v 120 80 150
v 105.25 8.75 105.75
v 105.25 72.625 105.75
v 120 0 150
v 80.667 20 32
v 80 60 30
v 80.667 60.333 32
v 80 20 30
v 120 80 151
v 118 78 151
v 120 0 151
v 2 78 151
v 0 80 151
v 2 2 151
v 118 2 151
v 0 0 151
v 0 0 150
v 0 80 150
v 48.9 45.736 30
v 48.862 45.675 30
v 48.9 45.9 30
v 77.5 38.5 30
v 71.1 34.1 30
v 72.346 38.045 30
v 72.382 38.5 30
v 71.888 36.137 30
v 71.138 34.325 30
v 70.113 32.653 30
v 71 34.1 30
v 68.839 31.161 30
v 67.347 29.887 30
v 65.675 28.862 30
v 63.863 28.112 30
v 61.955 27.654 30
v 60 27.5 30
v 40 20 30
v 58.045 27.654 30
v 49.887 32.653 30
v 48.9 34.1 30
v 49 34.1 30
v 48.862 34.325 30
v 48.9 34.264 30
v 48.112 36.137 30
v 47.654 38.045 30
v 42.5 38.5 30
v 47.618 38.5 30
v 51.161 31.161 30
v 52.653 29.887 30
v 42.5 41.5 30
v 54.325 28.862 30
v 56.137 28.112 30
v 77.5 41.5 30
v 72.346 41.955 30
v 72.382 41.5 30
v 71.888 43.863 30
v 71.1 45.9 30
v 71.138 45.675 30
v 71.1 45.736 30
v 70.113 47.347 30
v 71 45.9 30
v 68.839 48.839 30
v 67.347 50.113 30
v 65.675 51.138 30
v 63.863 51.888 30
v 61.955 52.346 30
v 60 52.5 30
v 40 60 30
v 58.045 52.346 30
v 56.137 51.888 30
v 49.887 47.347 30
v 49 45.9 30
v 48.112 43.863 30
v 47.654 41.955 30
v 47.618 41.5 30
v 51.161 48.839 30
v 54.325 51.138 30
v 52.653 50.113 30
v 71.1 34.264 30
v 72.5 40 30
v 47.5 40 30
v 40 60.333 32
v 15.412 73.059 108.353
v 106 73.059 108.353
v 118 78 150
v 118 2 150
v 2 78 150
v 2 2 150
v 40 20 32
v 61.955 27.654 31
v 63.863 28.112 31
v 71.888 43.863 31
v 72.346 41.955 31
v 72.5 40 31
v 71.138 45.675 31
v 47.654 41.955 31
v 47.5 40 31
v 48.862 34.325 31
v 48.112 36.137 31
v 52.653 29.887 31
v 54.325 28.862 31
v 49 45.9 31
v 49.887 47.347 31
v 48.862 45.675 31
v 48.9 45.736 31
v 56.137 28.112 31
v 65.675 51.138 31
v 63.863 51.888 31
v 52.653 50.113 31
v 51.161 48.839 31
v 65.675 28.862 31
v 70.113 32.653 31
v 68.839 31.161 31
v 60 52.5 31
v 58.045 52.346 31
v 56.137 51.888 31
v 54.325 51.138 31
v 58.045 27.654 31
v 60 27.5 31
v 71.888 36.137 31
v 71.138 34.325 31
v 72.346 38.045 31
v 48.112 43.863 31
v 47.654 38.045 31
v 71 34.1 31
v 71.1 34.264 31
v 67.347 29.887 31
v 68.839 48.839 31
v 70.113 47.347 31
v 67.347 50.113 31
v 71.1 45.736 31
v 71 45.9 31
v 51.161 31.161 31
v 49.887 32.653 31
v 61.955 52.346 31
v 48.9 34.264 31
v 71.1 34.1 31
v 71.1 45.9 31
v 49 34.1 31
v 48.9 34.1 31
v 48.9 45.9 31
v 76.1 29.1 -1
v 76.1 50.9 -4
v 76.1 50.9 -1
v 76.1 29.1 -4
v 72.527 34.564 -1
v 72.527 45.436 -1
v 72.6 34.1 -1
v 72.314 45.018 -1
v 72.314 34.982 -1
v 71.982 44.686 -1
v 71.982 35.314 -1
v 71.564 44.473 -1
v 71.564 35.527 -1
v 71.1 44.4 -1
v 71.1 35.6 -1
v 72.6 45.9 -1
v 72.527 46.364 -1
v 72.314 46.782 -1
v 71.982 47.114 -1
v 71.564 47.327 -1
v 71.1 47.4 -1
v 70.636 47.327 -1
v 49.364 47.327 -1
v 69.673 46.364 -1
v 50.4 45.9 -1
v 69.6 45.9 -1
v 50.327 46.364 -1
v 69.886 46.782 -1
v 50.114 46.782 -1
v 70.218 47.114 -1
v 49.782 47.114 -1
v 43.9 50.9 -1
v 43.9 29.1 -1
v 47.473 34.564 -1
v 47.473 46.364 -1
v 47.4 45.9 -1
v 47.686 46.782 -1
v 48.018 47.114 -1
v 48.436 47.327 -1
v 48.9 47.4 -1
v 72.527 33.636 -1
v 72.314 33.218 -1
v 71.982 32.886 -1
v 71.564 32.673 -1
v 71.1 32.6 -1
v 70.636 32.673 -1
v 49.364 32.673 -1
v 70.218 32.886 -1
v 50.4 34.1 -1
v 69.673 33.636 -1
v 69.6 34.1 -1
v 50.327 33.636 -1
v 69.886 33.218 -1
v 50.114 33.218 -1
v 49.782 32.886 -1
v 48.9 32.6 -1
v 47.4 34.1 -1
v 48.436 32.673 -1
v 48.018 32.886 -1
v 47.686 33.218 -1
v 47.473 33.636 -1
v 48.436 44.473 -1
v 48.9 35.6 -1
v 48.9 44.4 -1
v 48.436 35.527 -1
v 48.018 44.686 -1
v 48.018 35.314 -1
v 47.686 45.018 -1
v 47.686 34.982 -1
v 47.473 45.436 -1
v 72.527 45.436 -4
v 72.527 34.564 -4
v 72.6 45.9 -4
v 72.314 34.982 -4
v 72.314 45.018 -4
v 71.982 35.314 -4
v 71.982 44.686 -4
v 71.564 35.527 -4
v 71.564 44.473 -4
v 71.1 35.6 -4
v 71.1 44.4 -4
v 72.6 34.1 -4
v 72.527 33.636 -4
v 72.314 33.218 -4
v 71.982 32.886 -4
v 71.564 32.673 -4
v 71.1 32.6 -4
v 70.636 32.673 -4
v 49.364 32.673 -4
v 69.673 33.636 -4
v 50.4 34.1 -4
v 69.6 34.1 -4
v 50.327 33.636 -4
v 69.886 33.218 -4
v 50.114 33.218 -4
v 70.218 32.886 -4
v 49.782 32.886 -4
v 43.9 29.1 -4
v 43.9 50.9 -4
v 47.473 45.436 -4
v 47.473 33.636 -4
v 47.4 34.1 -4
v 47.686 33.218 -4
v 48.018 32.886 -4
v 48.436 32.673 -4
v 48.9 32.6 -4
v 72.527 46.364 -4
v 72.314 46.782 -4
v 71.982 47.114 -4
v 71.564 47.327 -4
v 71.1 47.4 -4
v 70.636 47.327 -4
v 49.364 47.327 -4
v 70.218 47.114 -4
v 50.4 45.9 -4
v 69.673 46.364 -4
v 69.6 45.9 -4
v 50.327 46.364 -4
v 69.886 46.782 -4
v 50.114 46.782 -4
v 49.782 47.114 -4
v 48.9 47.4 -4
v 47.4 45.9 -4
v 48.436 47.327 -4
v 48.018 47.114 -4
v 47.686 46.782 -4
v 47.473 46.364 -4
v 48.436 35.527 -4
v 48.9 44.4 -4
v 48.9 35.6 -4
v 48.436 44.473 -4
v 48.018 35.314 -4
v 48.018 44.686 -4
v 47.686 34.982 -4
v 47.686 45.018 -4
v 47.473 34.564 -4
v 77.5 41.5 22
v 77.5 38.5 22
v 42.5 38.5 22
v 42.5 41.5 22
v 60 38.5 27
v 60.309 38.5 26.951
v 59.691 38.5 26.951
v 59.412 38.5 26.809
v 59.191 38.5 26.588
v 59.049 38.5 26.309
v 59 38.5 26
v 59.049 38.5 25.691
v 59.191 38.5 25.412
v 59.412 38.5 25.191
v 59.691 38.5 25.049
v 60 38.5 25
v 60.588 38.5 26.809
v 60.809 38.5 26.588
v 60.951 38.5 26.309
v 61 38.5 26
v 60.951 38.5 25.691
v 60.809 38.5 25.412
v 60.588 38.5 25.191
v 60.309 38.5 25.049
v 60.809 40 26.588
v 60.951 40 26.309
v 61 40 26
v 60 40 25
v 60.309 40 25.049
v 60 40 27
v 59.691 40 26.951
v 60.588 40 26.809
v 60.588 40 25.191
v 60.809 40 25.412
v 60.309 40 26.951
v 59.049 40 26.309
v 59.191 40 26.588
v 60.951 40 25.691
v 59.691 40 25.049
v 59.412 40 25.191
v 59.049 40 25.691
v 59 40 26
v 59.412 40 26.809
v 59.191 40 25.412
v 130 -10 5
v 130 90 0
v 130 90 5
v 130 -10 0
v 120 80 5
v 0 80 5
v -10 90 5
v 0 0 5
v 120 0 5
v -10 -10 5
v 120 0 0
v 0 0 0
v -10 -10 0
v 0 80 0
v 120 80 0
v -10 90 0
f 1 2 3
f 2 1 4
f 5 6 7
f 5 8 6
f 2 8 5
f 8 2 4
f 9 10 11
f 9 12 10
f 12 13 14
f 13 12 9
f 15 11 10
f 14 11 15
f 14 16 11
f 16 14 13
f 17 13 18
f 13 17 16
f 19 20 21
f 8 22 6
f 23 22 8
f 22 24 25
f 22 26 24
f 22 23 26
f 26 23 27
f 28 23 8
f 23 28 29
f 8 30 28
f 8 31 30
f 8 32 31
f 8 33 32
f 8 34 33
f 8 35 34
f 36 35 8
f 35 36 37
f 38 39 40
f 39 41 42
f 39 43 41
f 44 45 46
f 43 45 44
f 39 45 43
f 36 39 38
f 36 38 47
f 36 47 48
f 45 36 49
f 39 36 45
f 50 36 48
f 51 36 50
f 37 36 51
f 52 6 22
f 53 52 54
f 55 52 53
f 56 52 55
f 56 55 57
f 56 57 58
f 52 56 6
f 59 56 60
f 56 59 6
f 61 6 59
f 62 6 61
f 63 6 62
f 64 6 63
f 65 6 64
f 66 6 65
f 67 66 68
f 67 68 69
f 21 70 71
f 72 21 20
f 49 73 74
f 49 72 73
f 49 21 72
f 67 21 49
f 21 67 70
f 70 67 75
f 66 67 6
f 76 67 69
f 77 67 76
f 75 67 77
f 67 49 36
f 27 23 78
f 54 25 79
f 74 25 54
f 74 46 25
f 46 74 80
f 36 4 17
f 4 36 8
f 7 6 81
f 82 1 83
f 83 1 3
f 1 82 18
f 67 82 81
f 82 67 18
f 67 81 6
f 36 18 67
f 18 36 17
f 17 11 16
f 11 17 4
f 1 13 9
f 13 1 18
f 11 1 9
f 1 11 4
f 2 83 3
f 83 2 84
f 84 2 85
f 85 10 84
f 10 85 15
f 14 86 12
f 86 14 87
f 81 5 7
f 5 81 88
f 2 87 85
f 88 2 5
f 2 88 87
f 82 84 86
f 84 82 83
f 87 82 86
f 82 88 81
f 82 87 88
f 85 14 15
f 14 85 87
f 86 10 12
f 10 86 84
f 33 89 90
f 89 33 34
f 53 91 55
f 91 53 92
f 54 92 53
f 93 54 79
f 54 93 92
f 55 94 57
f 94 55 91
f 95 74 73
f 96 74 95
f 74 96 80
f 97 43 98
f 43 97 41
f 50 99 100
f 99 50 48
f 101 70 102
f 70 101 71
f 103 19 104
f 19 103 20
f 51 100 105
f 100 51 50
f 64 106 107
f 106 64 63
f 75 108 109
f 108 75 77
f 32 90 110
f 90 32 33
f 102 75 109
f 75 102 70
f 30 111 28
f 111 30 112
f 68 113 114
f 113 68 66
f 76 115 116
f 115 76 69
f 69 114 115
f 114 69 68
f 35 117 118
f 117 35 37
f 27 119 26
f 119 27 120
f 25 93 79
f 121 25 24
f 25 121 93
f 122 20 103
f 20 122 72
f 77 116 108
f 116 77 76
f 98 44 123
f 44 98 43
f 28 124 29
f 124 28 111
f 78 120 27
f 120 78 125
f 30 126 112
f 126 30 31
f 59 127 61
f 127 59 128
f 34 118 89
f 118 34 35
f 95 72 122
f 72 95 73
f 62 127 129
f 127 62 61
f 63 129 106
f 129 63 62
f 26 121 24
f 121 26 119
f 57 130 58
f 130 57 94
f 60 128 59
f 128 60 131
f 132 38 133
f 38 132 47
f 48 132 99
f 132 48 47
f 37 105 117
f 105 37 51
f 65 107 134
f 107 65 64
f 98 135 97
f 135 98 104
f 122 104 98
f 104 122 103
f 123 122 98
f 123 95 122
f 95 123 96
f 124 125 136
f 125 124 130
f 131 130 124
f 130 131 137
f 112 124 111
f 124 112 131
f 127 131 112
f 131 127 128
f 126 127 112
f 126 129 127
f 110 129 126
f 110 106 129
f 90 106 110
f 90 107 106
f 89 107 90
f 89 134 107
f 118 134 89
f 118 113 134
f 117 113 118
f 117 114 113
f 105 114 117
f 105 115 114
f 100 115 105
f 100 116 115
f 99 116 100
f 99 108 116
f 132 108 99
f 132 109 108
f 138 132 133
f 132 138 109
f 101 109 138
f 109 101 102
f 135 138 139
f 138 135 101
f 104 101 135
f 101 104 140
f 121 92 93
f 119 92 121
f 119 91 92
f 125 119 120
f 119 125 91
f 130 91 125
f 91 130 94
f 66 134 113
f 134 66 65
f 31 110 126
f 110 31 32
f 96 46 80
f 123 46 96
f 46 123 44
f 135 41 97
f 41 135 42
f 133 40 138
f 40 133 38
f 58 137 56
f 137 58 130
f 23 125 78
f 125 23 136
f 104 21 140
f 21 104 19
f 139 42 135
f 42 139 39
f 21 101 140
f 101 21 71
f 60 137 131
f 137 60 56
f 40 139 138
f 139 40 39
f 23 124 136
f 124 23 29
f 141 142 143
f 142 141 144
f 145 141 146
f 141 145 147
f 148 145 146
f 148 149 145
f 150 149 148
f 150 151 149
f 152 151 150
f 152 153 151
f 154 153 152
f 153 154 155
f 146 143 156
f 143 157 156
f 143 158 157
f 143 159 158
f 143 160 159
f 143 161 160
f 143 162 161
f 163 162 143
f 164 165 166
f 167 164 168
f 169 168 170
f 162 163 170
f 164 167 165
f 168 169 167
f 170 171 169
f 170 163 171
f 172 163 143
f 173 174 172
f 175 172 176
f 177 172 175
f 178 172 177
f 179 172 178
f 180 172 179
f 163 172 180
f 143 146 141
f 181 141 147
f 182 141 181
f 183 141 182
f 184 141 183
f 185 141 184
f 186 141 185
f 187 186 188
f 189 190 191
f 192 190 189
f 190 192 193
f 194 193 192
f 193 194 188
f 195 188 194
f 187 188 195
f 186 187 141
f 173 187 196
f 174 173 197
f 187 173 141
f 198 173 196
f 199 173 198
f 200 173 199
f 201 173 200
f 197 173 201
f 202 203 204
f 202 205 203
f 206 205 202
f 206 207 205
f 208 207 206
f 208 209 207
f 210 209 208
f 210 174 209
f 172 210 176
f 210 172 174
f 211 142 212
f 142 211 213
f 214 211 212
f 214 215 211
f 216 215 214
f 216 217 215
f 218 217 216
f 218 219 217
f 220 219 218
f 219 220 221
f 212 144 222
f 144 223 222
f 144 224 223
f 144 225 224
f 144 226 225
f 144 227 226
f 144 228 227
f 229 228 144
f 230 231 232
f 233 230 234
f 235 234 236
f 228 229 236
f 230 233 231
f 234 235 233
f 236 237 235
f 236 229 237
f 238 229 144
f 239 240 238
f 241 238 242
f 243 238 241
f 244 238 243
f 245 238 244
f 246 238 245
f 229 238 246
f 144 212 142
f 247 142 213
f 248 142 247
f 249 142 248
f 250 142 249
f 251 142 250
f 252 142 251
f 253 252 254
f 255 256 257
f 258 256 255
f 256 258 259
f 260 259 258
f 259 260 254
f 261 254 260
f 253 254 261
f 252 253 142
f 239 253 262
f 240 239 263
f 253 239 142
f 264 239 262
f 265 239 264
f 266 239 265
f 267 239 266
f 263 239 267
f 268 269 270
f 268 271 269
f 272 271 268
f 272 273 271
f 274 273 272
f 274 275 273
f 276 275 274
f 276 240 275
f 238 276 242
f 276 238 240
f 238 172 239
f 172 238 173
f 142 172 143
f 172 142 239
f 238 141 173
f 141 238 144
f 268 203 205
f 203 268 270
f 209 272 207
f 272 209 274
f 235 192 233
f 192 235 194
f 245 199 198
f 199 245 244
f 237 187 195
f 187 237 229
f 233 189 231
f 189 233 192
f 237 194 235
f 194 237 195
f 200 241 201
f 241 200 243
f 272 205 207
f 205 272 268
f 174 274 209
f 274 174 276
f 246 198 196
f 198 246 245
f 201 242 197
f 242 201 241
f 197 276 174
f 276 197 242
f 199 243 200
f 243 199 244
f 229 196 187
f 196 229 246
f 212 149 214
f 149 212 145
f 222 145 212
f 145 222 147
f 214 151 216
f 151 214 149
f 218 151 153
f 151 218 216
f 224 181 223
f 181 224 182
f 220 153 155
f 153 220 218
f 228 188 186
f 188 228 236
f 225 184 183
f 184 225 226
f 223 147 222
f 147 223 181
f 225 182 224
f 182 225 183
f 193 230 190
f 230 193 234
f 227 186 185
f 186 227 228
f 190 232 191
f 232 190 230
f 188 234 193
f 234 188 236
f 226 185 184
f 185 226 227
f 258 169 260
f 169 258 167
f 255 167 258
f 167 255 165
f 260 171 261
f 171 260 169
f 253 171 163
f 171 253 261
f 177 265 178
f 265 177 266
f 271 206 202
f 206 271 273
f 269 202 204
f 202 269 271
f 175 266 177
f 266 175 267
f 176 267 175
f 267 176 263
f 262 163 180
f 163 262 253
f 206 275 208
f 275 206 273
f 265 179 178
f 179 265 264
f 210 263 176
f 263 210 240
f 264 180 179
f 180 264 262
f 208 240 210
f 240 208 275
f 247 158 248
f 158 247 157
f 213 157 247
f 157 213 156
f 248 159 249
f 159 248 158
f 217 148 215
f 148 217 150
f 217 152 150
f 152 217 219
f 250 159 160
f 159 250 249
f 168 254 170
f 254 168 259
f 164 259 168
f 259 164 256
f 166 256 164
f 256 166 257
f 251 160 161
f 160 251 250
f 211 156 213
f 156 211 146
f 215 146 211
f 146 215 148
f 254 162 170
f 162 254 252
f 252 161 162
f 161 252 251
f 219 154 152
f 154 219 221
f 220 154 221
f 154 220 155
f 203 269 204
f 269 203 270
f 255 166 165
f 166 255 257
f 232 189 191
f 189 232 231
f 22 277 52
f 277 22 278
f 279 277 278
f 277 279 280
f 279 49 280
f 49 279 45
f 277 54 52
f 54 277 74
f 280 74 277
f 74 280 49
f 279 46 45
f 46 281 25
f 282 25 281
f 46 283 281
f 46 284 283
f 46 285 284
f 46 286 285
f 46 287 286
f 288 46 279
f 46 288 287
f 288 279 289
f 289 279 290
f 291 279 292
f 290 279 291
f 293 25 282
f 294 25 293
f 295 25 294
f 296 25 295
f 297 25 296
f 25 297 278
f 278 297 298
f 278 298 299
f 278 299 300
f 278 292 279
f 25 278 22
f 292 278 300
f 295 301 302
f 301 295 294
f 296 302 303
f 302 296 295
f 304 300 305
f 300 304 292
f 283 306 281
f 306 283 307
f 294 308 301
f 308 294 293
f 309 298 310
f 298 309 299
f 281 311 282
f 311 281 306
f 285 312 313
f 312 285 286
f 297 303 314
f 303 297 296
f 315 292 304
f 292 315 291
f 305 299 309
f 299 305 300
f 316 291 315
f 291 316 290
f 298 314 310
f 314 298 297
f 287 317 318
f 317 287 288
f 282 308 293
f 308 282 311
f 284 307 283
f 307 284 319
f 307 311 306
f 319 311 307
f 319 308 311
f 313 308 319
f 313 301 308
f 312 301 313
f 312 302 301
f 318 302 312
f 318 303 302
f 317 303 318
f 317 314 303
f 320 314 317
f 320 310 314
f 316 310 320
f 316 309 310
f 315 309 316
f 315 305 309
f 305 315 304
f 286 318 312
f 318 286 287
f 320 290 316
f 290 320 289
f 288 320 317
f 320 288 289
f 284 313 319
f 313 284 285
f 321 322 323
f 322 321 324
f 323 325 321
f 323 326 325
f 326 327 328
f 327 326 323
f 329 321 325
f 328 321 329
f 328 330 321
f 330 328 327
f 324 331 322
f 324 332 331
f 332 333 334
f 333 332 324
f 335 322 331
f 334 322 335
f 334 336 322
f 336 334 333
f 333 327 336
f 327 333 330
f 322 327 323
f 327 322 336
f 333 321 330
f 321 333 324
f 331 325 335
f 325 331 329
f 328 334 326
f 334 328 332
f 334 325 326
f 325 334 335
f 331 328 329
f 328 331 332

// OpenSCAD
// Automated Cat Feeder - Food Hopper
// OpenSCAD file for 3D printing

// Parameters
hopper_width = 120;
hopper_depth = 80;
hopper_height = 150;
wall_thickness = 2;
neck_width = 40;
neck_height = 30;
outlet_diameter = 25;

// Servo mounting
servo_width = 22.2;
servo_depth = 11.8;
servo_height = 31;
servo_mount_thickness = 3;

module main_hopper() {
    difference() {
        // Main hopper body
        hull() {
            // Top opening
            translate([0, 0, hopper_height])
            cube([hopper_width, hopper_depth, 1]);
            
            // Bottom neck
            translate([(hopper_width - neck_width)/2, (hopper_depth - neck_width)/2, neck_height])
            cube([neck_width, neck_width, 1]);
        }
        
        // Internal cavity
        translate([wall_thickness, wall_thickness, wall_thickness])
        hull() {
            // Top opening
            translate([0, 0, hopper_height - wall_thickness])
            cube([hopper_width - 2*wall_thickness, hopper_depth - 2*wall_thickness, 1]);
            
            // Bottom neck
            translate([(hopper_width - neck_width)/2 - wall_thickness, (hopper_depth - neck_width)/2 - wall_thickness, neck_height])
            cube([neck_width + 2*wall_thickness, neck_width + 2*wall_thickness, 1]);
        }
        
        // Food outlet
        translate([hopper_width/2, hopper_depth/2, 0])
        cylinder(h = neck_height + 1, d = outlet_diameter, $fn = 40);
        
        // Servo mounting cutout
        translate([(hopper_width - servo_width)/2, (hopper_depth - servo_depth)/2, neck_height - servo_height])
        cube([servo_width, servo_depth, servo_height + 1]);
    }
}

module servo_mount() {
    // Servo mounting bracket
    translate([(hopper_width - servo_width - 10)/2, (hopper_depth - servo_depth - 10)/2, neck_height - servo_height - servo_mount_thickness])
    difference() {
        cube([servo_width + 10, servo_depth + 10, servo_mount_thickness]);
        
        // Servo mounting holes
        translate([5, 5, -1])
        cylinder(h = servo_mount_thickness + 2, d = 3, $fn = 20);
        
        translate([servo_width + 5, 5, -1])
        cylinder(h = servo_mount_thickness + 2, d = 3, $fn = 20);
        
        translate([5, servo_depth + 5, -1])
        cylinder(h = servo_mount_thickness + 2, d = 3, $fn = 20);
        
        translate([servo_width + 5, servo_depth + 5, -1])
        cylinder(h = servo_mount_thickness + 2, d = 3, $fn = 20);
        
        // Servo body cutout
        translate([5, 5, -1])
        cube([servo_width, servo_depth, servo_mount_thickness + 2]);
    }
}

module food_gate() {
    gate_width = outlet_diameter + 10;
    gate_height = 8;
    gate_depth = 3;
    
    // Gate arm
    translate([(hopper_width - gate_width)/2, hopper_depth/2 - gate_depth/2, neck_height - gate_height])
    difference() {
        cube([gate_width, gate_depth, gate_height]);
        
        // Servo arm attachment hole
        translate([gate_width/2, gate_depth/2, gate_height/2])
        rotate([90, 0, 0])
        cylinder(h = gate_depth + 2, d = 2, $fn = 20);
    }
}

module mounting_flange() {
    flange_width = hopper_width + 20;
    flange_depth = hopper_depth + 20;
    flange_height = 5;
    
    translate([-10, -10, 0])
    difference() {
        cube([flange_width, flange_depth, flange_height]);
        
        // Mounting holes
        for (x = [15, flange_width - 15]) {
            for (y = [15, flange_depth - 15]) {
                translate([x, y, -1])
                cylinder(h = flange_height + 2, d = 4, $fn = 20);
            }
        }
        
        // Center cutout for hopper
        translate([10, 10, -1])
        cube([hopper_width, hopper_depth, flange_height + 2]);
    }
}

module lid() {
    lid_width = hopper_width + 10;
    lid_depth = hopper_depth + 10;
    lid_height = 5;
    
    translate([-5, -5, hopper_height])
    difference() {
        cube([lid_width, lid_depth, lid_height]);
        
        // Handle cutout
        translate([lid_width/2 - 15, lid_depth/2 - 5, lid_height - 3])
        cube([30, 10, 4]);
        
        // Ventilation holes
        for (x = [10 : 20 : lid_width - 10]) {
            for (y = [10 : 20 : lid_depth - 10]) {
                translate([x, y, -1])
                cylinder(h = lid_height + 2, d = 3, $fn = 20);
            }
        }
    }
}

// Main assembly
main_hopper();
servo_mount();
food_gate();
mounting_flange();

// Uncomment to render lid separately
// lid(); 
